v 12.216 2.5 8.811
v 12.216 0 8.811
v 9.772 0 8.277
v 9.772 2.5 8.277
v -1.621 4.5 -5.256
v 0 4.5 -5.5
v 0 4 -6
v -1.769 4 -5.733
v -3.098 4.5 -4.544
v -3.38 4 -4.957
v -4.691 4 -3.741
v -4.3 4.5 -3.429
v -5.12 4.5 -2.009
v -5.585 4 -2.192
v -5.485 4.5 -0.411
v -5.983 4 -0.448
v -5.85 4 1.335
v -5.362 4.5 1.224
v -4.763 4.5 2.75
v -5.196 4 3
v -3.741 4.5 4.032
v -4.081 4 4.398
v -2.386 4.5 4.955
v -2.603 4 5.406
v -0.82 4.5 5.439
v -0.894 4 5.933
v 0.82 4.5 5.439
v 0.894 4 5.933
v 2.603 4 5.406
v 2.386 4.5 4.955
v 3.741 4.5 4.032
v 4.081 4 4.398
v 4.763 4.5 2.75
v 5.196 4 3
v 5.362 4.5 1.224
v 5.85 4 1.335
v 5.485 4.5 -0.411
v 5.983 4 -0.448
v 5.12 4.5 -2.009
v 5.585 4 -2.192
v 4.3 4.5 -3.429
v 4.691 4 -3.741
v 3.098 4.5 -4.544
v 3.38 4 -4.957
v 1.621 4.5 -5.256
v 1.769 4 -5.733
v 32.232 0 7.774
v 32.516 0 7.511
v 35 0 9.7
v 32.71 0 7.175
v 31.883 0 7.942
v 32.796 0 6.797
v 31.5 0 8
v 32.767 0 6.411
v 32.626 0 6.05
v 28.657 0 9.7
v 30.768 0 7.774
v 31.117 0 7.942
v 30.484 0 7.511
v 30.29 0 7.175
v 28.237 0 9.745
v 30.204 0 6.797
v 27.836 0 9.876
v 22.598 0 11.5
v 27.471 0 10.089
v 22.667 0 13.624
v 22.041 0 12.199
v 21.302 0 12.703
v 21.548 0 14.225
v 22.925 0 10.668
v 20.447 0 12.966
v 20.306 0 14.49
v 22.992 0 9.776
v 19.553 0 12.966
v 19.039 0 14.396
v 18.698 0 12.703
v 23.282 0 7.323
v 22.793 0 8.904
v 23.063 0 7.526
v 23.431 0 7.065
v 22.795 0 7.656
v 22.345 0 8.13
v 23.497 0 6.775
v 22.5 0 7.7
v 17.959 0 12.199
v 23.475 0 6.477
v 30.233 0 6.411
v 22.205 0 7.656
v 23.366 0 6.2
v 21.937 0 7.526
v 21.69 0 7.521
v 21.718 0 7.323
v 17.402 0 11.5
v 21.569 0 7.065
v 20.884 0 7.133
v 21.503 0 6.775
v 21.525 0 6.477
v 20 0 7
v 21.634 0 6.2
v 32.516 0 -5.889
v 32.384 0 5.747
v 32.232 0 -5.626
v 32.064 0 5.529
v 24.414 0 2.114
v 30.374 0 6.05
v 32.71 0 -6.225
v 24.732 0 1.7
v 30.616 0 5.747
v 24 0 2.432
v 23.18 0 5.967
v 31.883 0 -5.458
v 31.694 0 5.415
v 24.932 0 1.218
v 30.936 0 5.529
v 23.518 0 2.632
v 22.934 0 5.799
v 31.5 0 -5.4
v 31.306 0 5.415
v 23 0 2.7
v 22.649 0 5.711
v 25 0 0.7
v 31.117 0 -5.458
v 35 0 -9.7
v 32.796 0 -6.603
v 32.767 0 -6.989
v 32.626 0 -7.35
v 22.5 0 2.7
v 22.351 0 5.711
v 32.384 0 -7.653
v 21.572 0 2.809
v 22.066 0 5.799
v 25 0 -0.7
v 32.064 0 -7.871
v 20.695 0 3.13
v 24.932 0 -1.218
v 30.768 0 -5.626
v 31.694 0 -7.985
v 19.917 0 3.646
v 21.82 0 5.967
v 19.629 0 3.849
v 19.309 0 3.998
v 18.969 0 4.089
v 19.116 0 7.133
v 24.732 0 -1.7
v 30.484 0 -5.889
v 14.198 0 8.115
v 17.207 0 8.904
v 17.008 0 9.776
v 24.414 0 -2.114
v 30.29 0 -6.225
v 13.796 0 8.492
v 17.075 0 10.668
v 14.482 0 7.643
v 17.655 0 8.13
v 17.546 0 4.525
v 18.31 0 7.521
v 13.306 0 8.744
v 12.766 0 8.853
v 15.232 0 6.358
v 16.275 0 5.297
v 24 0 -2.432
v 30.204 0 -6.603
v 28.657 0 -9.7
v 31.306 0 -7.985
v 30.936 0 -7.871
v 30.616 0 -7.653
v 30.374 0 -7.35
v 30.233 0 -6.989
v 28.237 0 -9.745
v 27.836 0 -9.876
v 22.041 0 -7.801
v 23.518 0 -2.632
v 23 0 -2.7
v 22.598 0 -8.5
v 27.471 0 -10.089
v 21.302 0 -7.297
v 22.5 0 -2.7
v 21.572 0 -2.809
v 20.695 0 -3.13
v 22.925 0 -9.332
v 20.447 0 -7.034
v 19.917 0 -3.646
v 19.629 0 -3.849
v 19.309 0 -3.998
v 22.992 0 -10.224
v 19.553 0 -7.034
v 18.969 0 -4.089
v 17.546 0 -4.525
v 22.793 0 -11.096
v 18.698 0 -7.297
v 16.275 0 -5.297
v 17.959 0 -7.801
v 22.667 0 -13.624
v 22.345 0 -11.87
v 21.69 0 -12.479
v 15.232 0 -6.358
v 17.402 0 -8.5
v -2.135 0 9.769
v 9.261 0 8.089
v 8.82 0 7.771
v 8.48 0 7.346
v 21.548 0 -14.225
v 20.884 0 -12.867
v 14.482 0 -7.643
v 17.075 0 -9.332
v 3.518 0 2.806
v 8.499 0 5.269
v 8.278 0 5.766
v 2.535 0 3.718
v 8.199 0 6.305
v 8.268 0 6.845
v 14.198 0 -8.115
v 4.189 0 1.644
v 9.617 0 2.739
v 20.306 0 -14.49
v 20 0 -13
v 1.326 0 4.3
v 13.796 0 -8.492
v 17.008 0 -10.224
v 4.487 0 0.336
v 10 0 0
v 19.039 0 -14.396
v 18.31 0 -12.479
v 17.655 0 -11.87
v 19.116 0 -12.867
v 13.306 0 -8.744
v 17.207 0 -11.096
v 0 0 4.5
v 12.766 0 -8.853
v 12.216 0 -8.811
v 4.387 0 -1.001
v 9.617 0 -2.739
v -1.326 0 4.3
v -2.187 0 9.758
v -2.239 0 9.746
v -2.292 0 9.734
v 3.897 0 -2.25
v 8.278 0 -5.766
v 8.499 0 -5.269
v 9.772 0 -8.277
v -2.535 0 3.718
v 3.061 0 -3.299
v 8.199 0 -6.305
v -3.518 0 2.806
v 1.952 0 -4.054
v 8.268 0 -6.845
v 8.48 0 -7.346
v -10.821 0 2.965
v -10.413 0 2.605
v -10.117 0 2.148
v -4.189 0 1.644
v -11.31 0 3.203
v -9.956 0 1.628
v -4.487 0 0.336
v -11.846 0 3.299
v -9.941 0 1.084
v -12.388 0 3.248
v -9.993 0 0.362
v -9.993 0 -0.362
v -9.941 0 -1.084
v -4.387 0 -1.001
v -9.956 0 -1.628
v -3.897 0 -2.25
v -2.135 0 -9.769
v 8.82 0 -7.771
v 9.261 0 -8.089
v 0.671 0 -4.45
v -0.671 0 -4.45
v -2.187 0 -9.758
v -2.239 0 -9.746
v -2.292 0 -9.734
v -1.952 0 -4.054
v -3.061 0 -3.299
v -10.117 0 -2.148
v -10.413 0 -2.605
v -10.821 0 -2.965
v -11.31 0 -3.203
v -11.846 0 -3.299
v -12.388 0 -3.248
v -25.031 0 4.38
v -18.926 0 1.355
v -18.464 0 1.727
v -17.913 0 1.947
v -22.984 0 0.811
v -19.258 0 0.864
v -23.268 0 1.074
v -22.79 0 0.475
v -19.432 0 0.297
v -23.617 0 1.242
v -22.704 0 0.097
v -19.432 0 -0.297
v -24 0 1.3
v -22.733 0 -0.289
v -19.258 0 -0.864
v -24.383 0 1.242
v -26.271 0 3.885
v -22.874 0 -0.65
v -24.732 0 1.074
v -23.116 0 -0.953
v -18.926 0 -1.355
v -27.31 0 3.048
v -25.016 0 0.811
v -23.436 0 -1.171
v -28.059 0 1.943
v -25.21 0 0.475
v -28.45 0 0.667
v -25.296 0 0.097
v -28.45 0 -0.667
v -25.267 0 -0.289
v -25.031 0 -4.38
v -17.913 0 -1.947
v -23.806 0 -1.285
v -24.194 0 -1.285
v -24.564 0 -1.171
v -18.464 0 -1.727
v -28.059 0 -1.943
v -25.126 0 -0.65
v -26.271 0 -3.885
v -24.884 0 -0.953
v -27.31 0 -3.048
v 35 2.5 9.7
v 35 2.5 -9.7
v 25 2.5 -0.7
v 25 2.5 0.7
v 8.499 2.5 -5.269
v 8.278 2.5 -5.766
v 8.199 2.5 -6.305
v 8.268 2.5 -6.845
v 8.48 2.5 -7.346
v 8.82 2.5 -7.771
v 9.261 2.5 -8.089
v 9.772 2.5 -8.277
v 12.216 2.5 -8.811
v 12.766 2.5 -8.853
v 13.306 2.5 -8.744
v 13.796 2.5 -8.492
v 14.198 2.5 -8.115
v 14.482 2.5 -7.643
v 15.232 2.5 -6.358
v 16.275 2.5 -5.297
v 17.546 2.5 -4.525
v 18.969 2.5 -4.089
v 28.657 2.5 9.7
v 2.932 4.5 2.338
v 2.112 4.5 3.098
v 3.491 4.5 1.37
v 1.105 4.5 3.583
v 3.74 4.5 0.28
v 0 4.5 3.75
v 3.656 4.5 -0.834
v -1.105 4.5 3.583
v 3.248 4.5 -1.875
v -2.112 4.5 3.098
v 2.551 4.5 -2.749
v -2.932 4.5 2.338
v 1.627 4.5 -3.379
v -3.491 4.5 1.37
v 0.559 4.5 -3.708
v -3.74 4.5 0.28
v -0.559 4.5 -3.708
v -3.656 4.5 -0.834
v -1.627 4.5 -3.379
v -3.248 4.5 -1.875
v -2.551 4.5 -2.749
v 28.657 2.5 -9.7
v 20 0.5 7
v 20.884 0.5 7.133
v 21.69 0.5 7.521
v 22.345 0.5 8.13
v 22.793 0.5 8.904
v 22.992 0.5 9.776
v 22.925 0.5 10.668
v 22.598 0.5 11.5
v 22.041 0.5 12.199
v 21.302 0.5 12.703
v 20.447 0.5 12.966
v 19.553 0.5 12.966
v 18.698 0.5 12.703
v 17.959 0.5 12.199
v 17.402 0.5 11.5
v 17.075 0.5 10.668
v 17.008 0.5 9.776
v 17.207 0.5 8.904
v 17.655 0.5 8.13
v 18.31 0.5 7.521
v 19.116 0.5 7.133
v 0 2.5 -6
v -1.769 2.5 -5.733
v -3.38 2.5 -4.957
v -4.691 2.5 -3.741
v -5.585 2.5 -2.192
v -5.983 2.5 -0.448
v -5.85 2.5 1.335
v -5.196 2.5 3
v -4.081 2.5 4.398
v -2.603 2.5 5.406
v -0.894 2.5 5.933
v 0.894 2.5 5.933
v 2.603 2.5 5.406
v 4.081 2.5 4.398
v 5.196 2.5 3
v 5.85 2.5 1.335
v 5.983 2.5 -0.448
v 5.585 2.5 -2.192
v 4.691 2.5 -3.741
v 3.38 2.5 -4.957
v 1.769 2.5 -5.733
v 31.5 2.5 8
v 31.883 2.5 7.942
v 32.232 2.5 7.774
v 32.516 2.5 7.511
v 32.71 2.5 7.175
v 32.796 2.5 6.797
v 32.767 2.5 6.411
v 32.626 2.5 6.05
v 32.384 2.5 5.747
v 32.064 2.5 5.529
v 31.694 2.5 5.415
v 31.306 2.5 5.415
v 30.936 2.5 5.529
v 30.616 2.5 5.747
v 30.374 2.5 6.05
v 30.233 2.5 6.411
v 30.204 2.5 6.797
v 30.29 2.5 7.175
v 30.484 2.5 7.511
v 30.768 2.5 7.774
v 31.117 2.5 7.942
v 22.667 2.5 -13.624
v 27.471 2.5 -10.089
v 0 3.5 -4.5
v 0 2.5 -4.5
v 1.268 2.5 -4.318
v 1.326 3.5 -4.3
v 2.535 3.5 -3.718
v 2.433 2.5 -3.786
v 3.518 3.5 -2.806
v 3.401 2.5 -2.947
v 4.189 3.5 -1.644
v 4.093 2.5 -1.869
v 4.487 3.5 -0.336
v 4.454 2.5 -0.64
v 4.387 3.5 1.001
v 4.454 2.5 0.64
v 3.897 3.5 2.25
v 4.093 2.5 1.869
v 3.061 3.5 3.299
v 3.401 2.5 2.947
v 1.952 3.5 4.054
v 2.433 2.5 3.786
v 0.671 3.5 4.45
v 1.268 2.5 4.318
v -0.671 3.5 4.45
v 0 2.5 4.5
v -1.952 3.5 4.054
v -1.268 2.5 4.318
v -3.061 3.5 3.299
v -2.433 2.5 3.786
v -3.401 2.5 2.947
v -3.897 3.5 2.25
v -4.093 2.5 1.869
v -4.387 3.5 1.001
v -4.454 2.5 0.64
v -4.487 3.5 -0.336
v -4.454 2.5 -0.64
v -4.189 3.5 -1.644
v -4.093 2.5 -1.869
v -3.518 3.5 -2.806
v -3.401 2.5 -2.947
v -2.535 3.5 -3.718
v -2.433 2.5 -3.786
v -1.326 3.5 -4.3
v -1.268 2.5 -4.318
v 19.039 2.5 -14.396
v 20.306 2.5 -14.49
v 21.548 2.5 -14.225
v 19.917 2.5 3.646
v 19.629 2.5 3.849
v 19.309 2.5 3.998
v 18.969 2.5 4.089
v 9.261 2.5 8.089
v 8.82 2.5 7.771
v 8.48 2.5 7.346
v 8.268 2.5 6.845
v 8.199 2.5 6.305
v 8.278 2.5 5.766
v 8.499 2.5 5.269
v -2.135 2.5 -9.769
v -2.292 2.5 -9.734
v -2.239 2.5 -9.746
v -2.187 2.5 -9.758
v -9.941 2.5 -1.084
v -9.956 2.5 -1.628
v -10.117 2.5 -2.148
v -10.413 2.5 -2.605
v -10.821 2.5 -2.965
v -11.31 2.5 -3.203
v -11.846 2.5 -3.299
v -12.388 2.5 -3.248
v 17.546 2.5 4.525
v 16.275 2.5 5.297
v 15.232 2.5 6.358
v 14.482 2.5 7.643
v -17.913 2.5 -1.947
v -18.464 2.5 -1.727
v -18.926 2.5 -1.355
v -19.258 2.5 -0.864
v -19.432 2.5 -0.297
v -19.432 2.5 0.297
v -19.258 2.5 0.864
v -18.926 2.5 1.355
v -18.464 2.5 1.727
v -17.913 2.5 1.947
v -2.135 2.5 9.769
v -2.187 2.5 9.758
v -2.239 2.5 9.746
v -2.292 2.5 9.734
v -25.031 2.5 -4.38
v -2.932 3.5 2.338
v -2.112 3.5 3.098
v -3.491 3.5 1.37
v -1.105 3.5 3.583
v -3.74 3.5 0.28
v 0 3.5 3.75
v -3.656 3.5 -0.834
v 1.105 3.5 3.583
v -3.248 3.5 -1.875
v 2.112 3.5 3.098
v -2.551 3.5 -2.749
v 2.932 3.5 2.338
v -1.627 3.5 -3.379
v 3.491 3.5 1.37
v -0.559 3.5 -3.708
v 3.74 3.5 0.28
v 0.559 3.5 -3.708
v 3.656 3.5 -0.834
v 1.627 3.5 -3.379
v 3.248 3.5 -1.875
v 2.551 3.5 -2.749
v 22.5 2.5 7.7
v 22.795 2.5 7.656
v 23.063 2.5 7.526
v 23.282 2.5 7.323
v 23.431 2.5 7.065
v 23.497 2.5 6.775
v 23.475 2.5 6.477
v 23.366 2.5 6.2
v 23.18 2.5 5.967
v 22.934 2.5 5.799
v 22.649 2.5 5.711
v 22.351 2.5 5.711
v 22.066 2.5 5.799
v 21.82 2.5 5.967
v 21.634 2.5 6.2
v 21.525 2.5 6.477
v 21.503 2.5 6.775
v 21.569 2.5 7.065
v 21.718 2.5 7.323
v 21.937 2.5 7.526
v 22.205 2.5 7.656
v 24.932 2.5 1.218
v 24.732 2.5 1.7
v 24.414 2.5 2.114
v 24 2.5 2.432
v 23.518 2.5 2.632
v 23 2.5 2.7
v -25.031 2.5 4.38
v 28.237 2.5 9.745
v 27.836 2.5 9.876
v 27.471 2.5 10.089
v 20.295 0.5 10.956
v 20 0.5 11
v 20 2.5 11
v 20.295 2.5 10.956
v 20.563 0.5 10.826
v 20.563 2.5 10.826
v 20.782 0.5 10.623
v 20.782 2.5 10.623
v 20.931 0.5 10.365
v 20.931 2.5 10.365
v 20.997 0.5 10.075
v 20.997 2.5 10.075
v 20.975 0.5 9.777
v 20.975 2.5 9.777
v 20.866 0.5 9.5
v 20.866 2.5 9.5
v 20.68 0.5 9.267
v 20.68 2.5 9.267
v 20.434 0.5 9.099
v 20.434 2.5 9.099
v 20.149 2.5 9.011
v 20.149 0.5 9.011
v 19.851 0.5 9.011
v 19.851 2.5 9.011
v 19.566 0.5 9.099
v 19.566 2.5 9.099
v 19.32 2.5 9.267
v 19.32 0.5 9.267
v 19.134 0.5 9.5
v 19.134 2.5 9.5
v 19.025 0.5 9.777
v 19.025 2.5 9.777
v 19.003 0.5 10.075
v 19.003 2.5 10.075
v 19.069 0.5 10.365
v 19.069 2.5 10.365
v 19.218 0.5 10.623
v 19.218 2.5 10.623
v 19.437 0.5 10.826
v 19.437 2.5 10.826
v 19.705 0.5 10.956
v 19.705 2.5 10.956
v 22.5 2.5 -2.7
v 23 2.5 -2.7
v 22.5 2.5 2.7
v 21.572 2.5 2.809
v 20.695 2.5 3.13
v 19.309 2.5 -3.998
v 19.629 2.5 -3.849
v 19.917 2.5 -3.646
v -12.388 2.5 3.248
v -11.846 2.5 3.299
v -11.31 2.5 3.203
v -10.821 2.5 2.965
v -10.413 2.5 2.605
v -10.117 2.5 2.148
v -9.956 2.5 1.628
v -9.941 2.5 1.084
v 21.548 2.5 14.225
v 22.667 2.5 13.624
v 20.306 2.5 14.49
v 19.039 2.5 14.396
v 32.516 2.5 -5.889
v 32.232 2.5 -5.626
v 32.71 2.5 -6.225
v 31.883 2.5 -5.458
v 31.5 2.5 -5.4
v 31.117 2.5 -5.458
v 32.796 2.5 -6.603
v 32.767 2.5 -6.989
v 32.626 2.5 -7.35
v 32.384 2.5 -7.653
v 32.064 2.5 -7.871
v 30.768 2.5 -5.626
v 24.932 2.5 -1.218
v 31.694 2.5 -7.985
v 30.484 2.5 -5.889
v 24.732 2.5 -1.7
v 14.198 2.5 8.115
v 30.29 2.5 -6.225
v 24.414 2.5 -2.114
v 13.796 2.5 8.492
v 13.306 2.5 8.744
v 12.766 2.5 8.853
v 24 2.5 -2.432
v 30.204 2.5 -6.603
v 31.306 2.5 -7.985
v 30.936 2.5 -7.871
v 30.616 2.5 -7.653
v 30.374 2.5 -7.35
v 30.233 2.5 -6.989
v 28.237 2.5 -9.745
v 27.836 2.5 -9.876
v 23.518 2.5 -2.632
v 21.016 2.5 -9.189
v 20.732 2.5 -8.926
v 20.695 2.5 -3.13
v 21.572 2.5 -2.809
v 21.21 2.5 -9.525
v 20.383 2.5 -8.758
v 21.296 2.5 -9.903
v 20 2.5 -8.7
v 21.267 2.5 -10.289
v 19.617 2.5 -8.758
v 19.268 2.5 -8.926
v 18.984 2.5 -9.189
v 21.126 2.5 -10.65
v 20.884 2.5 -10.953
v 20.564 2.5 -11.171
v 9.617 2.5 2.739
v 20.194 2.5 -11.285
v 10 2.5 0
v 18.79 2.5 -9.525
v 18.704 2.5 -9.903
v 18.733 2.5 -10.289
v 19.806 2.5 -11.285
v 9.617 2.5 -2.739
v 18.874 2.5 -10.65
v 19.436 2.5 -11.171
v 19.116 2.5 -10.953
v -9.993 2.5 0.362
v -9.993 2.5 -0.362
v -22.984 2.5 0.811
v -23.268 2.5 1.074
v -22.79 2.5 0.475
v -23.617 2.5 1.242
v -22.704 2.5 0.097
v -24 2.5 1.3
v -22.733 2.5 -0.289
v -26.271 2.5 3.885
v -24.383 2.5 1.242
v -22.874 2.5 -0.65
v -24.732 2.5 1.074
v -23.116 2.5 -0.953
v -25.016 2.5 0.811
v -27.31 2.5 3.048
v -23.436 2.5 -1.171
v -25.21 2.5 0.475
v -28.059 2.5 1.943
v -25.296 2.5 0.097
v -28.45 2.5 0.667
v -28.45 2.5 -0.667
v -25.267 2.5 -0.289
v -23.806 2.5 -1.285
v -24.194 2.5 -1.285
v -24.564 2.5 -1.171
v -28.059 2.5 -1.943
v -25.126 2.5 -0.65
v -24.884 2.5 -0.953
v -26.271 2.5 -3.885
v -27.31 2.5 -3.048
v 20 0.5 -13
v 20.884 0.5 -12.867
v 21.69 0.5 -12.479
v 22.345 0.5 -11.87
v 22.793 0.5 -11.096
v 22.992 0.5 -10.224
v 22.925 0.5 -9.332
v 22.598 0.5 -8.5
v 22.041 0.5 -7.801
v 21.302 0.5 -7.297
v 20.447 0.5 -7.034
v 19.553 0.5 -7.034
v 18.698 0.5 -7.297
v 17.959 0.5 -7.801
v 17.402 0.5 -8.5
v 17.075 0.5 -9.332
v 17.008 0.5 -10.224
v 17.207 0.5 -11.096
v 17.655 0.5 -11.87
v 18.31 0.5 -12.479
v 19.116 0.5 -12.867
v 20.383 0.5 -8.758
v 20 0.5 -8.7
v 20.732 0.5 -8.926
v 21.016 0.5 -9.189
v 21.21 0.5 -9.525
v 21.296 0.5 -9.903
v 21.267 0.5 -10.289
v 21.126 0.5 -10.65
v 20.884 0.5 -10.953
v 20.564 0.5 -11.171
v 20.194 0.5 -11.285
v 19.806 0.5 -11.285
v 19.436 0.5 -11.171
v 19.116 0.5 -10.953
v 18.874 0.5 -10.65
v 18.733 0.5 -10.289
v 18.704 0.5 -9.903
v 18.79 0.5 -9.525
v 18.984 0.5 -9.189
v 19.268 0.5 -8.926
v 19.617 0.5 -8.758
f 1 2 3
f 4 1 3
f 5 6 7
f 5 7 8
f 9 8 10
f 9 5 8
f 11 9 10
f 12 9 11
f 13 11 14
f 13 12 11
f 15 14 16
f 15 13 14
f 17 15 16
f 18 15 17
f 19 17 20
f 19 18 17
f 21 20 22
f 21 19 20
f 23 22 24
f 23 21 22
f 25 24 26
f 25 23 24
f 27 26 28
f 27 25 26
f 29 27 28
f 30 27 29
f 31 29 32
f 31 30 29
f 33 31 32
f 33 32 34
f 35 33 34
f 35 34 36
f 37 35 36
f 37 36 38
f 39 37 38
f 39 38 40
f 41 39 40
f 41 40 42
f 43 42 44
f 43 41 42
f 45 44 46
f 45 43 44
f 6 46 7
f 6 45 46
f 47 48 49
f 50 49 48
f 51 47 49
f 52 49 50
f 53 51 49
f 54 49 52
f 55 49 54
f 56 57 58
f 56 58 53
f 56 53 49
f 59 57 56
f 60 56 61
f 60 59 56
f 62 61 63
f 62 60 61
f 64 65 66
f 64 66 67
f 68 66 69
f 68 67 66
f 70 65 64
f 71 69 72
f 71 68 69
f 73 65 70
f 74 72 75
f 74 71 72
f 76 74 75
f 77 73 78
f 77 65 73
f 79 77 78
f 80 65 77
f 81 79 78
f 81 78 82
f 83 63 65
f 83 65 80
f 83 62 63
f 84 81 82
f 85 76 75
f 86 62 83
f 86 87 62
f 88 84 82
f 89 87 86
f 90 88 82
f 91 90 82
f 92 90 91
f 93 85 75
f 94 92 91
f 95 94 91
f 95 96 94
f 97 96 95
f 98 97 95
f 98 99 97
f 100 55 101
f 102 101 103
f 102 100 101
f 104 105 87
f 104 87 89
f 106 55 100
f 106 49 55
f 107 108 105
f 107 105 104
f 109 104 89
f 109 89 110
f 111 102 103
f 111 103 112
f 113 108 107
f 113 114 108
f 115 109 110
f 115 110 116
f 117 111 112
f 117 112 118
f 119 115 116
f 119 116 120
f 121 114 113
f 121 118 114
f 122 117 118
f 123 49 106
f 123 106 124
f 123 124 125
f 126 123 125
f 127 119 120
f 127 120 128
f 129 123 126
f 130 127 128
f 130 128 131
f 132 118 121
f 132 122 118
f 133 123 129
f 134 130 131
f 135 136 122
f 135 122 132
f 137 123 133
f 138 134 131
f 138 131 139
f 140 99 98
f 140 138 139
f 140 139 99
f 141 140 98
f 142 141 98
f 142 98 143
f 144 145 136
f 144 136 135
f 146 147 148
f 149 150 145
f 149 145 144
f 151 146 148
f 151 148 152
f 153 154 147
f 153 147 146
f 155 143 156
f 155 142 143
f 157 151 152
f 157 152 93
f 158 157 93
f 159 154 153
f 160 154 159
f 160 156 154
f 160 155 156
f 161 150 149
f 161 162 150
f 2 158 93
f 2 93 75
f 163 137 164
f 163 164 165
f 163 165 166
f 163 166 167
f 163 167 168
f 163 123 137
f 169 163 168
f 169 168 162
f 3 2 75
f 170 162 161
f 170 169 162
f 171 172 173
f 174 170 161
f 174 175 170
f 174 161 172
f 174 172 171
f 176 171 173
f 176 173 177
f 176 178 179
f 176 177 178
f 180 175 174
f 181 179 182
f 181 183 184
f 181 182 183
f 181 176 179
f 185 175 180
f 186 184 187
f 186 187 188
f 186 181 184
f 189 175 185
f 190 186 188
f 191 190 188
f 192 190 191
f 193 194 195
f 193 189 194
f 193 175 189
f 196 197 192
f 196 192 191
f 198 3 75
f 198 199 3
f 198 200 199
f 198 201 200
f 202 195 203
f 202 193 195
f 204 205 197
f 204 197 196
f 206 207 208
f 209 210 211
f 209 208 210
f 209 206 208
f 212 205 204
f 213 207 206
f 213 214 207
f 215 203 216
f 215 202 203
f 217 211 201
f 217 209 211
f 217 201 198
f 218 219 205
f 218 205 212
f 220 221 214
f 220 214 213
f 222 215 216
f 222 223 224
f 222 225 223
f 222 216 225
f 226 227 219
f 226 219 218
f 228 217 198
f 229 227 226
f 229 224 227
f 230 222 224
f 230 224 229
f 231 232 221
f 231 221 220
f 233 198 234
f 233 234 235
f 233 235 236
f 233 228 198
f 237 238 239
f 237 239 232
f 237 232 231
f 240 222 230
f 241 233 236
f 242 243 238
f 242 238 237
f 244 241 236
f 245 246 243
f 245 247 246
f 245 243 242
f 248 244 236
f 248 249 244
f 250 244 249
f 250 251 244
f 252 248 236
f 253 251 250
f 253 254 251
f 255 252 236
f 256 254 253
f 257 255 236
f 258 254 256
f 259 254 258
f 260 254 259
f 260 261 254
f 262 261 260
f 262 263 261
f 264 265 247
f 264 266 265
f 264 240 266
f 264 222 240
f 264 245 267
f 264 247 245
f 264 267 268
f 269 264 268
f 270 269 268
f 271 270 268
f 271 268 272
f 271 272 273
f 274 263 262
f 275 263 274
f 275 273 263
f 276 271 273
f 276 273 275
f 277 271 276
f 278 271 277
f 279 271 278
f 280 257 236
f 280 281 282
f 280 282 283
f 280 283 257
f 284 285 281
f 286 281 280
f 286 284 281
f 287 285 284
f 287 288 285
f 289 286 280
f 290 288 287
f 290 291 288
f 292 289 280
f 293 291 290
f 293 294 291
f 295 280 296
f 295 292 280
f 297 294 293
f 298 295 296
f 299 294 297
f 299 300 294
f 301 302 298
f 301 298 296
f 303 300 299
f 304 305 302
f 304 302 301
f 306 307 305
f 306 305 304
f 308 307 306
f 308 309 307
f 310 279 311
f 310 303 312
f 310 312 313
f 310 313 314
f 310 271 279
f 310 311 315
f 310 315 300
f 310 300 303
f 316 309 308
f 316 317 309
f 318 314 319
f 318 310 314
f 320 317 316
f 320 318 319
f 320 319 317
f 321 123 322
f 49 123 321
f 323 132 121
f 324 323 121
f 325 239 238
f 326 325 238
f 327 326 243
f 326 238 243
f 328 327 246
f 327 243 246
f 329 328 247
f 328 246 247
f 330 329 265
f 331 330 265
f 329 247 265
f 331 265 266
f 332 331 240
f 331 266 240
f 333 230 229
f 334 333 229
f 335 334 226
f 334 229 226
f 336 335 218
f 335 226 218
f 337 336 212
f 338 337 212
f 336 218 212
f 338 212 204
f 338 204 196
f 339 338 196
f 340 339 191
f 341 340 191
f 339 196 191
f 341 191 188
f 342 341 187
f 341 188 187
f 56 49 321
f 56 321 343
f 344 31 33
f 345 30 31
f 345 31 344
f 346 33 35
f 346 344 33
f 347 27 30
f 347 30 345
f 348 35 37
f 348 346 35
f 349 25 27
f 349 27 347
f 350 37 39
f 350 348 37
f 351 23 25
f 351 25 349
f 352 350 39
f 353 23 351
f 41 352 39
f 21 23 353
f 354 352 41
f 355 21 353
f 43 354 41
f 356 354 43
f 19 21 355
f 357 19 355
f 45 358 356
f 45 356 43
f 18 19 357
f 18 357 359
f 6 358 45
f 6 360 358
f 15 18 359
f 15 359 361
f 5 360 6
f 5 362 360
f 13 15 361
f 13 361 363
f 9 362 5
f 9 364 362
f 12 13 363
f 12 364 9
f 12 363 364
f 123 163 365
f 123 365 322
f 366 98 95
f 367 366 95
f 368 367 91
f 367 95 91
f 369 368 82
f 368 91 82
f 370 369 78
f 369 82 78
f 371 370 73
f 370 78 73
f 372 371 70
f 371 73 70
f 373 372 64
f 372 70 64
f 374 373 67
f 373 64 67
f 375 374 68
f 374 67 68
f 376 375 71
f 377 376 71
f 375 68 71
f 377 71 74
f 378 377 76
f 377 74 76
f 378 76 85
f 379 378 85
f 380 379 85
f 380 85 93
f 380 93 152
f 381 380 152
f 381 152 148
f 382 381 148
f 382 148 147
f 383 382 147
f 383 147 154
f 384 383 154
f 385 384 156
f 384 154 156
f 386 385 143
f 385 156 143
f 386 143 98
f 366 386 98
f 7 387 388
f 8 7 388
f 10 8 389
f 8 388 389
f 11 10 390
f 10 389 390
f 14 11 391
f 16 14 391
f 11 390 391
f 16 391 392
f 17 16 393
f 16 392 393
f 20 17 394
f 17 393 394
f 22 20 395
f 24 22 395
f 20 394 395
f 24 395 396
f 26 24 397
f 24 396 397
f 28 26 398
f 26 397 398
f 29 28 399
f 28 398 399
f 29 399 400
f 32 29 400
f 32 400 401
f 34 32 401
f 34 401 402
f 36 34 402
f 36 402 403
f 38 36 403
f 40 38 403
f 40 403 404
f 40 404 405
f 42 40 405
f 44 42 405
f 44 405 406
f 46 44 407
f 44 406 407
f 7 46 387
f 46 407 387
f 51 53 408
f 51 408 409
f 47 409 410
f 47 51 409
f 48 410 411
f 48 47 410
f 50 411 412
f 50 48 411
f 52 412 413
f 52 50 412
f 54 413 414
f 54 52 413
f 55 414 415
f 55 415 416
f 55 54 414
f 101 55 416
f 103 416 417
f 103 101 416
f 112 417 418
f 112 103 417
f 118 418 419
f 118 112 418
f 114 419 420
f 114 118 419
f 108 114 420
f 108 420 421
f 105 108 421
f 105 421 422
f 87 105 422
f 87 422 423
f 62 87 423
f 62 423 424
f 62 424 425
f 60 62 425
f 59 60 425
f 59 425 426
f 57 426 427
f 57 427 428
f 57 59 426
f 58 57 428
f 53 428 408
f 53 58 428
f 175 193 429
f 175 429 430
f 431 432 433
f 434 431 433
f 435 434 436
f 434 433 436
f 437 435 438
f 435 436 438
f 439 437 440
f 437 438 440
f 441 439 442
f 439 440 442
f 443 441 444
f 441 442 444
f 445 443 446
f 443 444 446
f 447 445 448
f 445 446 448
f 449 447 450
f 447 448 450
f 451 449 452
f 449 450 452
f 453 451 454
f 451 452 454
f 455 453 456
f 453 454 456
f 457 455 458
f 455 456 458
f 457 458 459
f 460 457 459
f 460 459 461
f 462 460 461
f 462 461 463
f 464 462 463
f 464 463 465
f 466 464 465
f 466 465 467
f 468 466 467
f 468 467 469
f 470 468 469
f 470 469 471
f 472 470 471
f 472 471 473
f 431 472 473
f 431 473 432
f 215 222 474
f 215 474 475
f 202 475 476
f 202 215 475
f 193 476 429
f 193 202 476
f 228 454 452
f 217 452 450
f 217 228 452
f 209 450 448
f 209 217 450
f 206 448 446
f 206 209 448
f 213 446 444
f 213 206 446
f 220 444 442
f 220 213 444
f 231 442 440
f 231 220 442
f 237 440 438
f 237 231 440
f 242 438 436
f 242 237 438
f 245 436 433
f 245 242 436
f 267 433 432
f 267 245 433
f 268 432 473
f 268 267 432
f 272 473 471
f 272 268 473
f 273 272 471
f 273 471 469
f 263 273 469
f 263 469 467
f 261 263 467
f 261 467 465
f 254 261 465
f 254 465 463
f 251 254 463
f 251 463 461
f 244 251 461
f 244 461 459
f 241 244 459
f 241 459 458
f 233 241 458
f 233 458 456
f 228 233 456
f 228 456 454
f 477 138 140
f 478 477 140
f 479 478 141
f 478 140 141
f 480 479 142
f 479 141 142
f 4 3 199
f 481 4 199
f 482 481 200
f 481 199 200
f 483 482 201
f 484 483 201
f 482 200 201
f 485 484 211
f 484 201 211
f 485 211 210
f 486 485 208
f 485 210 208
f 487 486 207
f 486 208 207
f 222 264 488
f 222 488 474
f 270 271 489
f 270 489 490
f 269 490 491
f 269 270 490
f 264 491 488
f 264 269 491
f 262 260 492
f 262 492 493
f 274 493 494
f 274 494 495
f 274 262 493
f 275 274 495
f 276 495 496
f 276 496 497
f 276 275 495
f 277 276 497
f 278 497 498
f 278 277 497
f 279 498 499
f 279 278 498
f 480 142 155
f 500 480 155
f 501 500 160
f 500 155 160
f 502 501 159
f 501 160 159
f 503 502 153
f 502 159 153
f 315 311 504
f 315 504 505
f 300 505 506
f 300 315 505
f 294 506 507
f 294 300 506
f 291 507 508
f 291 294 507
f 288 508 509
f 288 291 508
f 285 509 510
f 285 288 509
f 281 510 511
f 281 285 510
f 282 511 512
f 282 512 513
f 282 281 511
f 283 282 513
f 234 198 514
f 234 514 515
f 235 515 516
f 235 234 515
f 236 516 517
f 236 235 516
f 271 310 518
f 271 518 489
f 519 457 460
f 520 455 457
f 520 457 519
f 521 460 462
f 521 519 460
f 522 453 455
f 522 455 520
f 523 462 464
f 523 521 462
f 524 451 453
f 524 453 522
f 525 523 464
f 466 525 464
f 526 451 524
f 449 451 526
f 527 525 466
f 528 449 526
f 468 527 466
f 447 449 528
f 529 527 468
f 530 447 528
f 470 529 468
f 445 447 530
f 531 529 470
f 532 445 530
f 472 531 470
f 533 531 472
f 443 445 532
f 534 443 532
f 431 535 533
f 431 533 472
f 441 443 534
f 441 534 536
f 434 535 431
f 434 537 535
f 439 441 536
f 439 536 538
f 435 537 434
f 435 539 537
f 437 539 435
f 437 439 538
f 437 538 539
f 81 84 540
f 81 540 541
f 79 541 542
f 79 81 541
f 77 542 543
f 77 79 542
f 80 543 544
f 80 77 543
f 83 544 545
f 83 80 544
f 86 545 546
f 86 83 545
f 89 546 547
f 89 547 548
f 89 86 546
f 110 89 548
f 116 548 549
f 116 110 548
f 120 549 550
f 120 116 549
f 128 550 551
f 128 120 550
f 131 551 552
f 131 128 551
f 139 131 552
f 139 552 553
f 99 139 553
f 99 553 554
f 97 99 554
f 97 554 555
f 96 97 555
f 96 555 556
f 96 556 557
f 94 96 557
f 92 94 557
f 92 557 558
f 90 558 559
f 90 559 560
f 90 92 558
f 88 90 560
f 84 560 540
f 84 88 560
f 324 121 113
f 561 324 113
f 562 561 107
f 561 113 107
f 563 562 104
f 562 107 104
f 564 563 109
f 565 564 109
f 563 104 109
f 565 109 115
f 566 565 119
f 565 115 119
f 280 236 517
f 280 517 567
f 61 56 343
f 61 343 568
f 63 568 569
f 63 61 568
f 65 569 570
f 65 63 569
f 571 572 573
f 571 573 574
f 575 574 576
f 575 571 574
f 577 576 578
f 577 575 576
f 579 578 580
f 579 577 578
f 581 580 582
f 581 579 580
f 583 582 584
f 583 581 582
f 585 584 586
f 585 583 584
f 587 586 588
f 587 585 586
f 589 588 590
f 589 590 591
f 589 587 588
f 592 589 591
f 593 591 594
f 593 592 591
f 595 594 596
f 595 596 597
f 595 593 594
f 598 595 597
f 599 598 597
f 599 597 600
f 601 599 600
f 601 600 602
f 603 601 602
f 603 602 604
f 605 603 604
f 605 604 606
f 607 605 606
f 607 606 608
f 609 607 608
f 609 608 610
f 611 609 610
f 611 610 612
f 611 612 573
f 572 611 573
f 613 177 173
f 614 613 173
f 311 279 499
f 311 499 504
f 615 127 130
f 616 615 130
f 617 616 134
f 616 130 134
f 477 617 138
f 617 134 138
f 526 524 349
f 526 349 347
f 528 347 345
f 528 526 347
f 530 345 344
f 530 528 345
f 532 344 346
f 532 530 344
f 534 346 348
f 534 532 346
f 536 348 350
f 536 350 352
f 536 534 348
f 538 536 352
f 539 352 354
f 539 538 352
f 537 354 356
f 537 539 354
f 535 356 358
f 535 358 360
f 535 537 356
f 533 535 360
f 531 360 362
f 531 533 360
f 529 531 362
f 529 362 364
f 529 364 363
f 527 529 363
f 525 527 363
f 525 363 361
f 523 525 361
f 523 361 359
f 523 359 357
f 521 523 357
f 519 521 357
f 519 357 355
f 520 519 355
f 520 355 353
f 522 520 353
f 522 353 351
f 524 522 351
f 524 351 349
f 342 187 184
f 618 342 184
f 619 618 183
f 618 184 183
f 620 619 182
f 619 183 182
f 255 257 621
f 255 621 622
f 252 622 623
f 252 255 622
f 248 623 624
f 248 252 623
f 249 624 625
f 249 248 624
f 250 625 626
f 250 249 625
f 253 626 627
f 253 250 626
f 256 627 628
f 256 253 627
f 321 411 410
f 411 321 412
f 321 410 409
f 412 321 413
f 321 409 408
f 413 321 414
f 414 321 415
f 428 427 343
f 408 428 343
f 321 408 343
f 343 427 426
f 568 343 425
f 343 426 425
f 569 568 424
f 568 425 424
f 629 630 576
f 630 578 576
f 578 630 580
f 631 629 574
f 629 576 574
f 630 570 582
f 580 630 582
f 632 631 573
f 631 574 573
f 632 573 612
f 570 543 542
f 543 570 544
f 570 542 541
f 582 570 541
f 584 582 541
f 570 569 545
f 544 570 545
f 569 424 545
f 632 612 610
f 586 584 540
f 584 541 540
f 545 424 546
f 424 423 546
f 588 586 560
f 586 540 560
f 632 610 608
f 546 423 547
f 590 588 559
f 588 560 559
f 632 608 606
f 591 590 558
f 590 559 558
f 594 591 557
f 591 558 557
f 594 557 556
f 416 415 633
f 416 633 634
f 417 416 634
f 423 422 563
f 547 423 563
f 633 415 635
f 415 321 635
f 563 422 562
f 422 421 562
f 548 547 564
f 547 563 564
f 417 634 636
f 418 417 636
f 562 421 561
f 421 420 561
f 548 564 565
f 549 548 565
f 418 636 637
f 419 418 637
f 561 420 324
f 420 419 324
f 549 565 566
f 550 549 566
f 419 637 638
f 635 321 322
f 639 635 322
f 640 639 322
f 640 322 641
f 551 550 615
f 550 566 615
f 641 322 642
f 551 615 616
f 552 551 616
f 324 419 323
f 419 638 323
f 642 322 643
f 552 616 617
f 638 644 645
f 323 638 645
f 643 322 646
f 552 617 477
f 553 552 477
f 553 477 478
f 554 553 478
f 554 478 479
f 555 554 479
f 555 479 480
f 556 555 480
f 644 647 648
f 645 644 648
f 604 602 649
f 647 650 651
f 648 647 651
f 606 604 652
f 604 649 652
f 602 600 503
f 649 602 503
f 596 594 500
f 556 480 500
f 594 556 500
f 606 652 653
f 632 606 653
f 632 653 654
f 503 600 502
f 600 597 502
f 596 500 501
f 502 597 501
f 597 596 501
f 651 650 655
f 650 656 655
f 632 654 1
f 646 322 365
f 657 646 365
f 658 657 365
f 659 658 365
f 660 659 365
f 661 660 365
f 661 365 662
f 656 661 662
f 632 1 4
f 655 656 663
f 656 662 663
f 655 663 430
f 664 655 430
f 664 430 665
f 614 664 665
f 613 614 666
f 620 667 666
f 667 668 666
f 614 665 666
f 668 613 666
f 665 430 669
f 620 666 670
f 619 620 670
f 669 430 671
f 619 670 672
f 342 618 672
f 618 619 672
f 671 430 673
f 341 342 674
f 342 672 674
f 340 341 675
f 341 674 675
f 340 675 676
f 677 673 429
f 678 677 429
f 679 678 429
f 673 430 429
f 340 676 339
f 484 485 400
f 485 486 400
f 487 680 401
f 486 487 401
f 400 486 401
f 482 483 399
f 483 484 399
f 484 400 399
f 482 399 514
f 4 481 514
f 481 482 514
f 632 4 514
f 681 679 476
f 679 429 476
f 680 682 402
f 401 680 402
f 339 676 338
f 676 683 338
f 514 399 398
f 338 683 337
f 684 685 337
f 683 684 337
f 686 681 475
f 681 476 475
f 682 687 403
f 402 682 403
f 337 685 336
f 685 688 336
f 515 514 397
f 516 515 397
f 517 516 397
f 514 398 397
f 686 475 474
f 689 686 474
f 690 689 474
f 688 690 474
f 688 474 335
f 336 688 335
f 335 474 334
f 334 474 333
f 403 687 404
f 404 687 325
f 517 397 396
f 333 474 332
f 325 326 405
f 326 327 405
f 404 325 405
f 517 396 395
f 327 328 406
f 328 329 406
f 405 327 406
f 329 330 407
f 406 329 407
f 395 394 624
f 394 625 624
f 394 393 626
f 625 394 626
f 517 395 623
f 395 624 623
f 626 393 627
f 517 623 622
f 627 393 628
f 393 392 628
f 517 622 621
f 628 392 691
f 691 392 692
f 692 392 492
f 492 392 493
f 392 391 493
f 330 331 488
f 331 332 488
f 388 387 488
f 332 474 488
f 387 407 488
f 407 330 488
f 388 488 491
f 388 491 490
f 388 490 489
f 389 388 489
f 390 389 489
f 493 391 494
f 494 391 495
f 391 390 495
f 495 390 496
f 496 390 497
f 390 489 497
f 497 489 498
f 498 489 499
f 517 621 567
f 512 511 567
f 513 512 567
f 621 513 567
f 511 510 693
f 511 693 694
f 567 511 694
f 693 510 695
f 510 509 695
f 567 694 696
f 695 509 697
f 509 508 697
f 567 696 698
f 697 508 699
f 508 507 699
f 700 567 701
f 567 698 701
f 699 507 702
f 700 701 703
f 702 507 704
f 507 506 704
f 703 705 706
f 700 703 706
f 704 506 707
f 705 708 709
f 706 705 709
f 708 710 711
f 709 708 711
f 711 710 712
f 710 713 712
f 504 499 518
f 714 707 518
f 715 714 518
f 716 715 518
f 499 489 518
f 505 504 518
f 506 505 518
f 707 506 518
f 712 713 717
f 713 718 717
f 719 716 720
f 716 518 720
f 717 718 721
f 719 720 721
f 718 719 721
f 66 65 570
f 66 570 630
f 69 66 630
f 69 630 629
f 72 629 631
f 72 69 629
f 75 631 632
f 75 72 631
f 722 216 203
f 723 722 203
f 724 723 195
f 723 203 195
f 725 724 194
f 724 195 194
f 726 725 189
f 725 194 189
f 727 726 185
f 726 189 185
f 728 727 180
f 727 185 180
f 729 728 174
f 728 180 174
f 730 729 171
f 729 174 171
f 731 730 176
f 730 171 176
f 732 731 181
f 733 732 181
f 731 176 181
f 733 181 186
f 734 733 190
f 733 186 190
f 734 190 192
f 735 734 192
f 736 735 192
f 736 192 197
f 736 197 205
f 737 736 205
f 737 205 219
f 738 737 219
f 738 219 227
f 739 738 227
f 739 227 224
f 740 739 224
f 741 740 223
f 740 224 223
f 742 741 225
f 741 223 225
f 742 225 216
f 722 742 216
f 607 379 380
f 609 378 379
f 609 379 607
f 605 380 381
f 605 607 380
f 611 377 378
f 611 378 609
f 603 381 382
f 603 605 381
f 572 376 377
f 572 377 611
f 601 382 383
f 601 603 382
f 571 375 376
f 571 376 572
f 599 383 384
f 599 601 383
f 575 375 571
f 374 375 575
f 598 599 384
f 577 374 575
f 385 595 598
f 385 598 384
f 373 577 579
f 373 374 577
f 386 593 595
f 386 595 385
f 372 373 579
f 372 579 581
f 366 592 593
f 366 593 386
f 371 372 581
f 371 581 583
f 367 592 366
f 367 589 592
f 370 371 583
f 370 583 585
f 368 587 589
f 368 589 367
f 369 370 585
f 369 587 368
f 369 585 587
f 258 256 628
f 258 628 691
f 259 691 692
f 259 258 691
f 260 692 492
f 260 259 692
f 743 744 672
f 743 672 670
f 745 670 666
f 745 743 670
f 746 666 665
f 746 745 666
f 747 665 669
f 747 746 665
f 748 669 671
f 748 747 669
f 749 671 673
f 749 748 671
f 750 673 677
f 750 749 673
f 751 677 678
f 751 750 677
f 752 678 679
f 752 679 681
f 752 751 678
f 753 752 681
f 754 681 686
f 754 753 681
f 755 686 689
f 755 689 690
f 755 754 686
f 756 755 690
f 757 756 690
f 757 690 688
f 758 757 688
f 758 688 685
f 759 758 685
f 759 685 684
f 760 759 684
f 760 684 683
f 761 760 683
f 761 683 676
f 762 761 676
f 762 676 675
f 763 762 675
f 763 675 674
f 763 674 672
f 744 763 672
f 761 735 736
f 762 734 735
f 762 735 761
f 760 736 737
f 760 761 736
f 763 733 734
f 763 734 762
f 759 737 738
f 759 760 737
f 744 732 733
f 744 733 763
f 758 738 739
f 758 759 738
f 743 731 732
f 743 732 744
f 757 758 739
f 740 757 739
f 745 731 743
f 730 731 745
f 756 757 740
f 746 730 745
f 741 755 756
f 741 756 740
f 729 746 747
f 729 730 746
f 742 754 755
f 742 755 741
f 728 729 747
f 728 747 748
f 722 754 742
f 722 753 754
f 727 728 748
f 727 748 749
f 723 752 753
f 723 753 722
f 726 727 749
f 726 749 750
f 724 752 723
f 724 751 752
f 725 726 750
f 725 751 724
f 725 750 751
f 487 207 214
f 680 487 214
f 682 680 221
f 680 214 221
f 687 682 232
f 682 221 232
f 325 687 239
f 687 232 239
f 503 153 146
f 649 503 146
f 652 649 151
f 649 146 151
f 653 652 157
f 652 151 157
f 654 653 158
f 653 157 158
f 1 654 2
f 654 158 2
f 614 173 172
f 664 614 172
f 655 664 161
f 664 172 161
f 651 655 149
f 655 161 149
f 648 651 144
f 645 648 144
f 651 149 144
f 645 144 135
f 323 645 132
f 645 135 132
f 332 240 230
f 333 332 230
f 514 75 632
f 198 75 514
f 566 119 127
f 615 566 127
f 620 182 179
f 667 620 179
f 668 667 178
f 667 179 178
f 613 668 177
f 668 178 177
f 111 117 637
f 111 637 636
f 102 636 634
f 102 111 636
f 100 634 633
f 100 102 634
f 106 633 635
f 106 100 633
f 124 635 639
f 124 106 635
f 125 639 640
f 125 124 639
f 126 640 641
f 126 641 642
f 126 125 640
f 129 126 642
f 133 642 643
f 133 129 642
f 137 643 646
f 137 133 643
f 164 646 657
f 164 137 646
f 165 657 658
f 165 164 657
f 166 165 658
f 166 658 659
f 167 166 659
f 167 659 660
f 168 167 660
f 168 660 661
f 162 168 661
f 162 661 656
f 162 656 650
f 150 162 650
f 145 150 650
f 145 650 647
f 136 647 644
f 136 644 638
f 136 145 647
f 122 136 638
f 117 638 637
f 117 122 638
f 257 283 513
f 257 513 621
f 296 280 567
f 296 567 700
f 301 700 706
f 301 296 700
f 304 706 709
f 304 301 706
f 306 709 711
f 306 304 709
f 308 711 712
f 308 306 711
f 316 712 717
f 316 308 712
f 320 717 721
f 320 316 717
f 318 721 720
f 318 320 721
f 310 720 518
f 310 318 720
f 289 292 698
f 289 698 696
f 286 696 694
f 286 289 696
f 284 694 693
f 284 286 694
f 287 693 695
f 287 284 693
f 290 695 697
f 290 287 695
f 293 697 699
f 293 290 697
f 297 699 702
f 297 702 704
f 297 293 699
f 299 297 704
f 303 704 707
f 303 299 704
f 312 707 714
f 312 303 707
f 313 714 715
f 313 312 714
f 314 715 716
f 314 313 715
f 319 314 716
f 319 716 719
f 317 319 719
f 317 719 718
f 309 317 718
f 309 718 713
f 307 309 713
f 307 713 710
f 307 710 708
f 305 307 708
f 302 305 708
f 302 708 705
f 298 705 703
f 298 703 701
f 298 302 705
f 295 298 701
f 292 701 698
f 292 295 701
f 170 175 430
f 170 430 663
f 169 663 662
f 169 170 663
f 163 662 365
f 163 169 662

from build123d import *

# Parameters (mm, degrees)
SKETCH1_R           = 1.3
SKETCH1_R_2         = 1
SKETCH1_R_3         = 4.5
BOSS_EXTRUDE1_DEPTH = 2.5
SKETCH3_R           = 6
SKETCH3_R_2         = 3.75
BOSS_EXTRUDE2_DEPTH = 2
SKETCH4_R           = 4.5
SKETCH4_R_2         = 3.75
CUT_EXTRUDE1_DEPTH  = 1
CHAMFER1_SIZE       = 0.5
SKETCH6_R           = 3
CUT_EXTRUDE2_DEPTH  = 0.5


with BuildPart() as part:
    # Sketch1 → Boss-Extrude1 (new body)
    with BuildSketch(Plane(origin=(0, 0, 0), x_dir=(1, 0, 0), z_dir=(0, 1, 0))):
        with BuildLine():
            Line((35, 9.7), (35, -9.7))
            Line((35, -9.7), (28.656580513, -9.7))
            ThreePointArc((28.656580513, -9.7), (28.032756183, -9.799778117), (27.471175871, -10.089156794))
            Line((27.471175871, -10.089156794), (22.667160445, -13.62438739))
            ThreePointArc((22.667160445, -13.62438739), (20.936486005, -14.401466515), (19.039367435, -14.396259626))
            Line((19.039367435, -14.396259626), (-2.134739034, -9.769487666))
            ThreePointArc((-2.134739034, -9.769487666), (-2.213274492, -9.751995489), (-2.291666667, -9.733871989))
            Line((-2.291666667, -9.733871989), (-25.03125, -4.380242395))
            ThreePointArc((-25.03125, -4.380242395), (-28.5, 0), (-25.03125, 4.380242395))
            Line((-25.03125, 4.380242395), (-2.291666667, 9.733871989))
            ThreePointArc((-2.291666667, 9.733871989), (-2.213276651, 9.751994999), (-2.13474336, 9.769486721))
            Line((-2.13474336, 9.769486721), (19.039365488, 14.396269024))
            ThreePointArc((19.039365488, 14.396269024), (20.936487661, 14.401475987), (22.667164776, 13.624394026))
            Line((22.667164776, 13.624394026), (27.47117527, 10.089158211))
            ThreePointArc((27.47117527, 10.089158211), (28.032756372, 9.799778489), (28.656581837, 9.7))
            Line((28.656581837, 9.7), (35, 9.7))
        make_face()
        with Locations((31.5, 6.7)):
            Circle(SKETCH1_R, mode=Mode.SUBTRACT)
        with Locations((31.5, -6.7)):
            Circle(SKETCH1_R, mode=Mode.SUBTRACT)
        with Locations((20, 10)):
            Circle(SKETCH1_R, mode=Mode.SUBTRACT)
        with Locations((20, -9.999990176)):
            Circle(SKETCH1_R_2, mode=Mode.SUBTRACT)
        Circle(SKETCH1_R_3, mode=Mode.SUBTRACT)
        with Locations((-24, 0)):
            Circle(SKETCH1_R, mode=Mode.SUBTRACT)
        with Locations((22.5, -6.7)):
            Circle(SKETCH1_R_2, mode=Mode.SUBTRACT)
        with BuildLine():
            Line((9.772066478, 8.276878442), (12.216286037, 8.810968065))
            ThreePointArc((12.216286037, 8.810968065), (13.559618748, 8.634777191), (14.482426032, 7.642803041))
            ThreePointArc((14.482426032, 7.642803041), (16.274630398, 5.296637232), (18.968838896, 4.089271891))
            ThreePointArc((18.968838896, 4.089271891), (19.472295347, 3.930738723), (19.916745685, 3.646019459))
            ThreePointArc((19.916745685, 3.646019459), (21.124485944, 2.943943413), (22.5, 2.7))
            Line((22.5, 2.7), (23, 2.7))
            ThreePointArc((23, 2.7), (24.414213562, 2.114213562), (25, 0.7))
            Line((25, 0.7), (25, -0.7))
            ThreePointArc((25, -0.7), (24.414213562, -2.114213562), (23, -2.7))
            Line((23, -2.7), (22.5, -2.7))
            ThreePointArc((22.5, -2.7), (21.124485854, -2.943943446), (19.916745538, -3.646019583))
            ThreePointArc((19.916745538, -3.646019583), (19.472295389, -3.930738787), (18.968839153, -4.089271995))
            ThreePointArc((18.968839153, -4.089271995), (16.274635438, -5.296635948), (14.482434575, -7.642798226))
            ThreePointArc((14.482434575, -7.642798226), (13.559627706, -8.634772461), (12.216295281, -8.810963823))
            Line((12.216295281, -8.810963823), (9.772070143, -8.276874115))
            ThreePointArc((9.772070143, -8.276874115), (8.357168863, -7.102458424), (8.499181625, -5.269147152))
            ThreePointArc((8.499181625, -5.269147152), (10, 2.214e-06), (8.499179292, 5.269150915))
            ThreePointArc((8.499179292, 5.269150915), (8.357165718, 7.102462125), (9.772066478, 8.276878442))
        make_face(mode=Mode.SUBTRACT)
        with BuildLine():
            Line((-17.912878788, -1.946774398), (-12.387619024, -3.247598329))
            ThreePointArc((-12.387619024, -3.247598329), (-10.604369925, -2.799022253), (-9.941071409, -1.084019943))
            ThreePointArc((-9.941071409, -1.084019943), (-10, 0), (-9.941071409, 1.084019943))
            ThreePointArc((-9.941071409, 1.084019943), (-10.604369925, 2.799022253), (-12.387619024, 3.247598329))
            Line((-12.387619024, 3.247598329), (-17.912878788, 1.946774398))
            ThreePointArc((-17.912878788, 1.946774398), (-19.454545455, 0), (-17.912878788, -1.946774398))
        make_face(mode=Mode.SUBTRACT)
    extrude(amount=BOSS_EXTRUDE1_DEPTH)

    # Sketch3 → Boss-Extrude2 (add)
    with BuildSketch(Plane(origin=(0, 2.5, 0), x_dir=(1, 0, 0), z_dir=(0, 1, 0))):
        Circle(SKETCH3_R)
        Circle(SKETCH3_R_2, mode=Mode.SUBTRACT)
    extrude(amount=BOSS_EXTRUDE2_DEPTH)

    # Sketch4 → Cut-Extrude1 (cut)
    with BuildSketch(Plane.XZ.offset(-2.5)):
        Circle(SKETCH4_R)
        Circle(SKETCH4_R_2, mode=Mode.SUBTRACT)
    extrude(amount=-CUT_EXTRUDE1_DEPTH, mode=Mode.SUBTRACT)

    # Chamfer1
    chamfer1_edges = [part.edges().sort_by_distance(p)[0] for p in [
        (-6, 4.5, 0),
    ]]
    chamfer(chamfer1_edges, length=CHAMFER1_SIZE)

    # Sketch6 → Cut-Extrude2 (cut)
    with BuildSketch(Plane.XZ):
        with Locations((20, 9.999990176)):
            Circle(SKETCH6_R)
        with Locations((20, -10)):
            Circle(SKETCH6_R)
    extrude(amount=-CUT_EXTRUDE2_DEPTH, mode=Mode.SUBTRACT)


solid = part.part
